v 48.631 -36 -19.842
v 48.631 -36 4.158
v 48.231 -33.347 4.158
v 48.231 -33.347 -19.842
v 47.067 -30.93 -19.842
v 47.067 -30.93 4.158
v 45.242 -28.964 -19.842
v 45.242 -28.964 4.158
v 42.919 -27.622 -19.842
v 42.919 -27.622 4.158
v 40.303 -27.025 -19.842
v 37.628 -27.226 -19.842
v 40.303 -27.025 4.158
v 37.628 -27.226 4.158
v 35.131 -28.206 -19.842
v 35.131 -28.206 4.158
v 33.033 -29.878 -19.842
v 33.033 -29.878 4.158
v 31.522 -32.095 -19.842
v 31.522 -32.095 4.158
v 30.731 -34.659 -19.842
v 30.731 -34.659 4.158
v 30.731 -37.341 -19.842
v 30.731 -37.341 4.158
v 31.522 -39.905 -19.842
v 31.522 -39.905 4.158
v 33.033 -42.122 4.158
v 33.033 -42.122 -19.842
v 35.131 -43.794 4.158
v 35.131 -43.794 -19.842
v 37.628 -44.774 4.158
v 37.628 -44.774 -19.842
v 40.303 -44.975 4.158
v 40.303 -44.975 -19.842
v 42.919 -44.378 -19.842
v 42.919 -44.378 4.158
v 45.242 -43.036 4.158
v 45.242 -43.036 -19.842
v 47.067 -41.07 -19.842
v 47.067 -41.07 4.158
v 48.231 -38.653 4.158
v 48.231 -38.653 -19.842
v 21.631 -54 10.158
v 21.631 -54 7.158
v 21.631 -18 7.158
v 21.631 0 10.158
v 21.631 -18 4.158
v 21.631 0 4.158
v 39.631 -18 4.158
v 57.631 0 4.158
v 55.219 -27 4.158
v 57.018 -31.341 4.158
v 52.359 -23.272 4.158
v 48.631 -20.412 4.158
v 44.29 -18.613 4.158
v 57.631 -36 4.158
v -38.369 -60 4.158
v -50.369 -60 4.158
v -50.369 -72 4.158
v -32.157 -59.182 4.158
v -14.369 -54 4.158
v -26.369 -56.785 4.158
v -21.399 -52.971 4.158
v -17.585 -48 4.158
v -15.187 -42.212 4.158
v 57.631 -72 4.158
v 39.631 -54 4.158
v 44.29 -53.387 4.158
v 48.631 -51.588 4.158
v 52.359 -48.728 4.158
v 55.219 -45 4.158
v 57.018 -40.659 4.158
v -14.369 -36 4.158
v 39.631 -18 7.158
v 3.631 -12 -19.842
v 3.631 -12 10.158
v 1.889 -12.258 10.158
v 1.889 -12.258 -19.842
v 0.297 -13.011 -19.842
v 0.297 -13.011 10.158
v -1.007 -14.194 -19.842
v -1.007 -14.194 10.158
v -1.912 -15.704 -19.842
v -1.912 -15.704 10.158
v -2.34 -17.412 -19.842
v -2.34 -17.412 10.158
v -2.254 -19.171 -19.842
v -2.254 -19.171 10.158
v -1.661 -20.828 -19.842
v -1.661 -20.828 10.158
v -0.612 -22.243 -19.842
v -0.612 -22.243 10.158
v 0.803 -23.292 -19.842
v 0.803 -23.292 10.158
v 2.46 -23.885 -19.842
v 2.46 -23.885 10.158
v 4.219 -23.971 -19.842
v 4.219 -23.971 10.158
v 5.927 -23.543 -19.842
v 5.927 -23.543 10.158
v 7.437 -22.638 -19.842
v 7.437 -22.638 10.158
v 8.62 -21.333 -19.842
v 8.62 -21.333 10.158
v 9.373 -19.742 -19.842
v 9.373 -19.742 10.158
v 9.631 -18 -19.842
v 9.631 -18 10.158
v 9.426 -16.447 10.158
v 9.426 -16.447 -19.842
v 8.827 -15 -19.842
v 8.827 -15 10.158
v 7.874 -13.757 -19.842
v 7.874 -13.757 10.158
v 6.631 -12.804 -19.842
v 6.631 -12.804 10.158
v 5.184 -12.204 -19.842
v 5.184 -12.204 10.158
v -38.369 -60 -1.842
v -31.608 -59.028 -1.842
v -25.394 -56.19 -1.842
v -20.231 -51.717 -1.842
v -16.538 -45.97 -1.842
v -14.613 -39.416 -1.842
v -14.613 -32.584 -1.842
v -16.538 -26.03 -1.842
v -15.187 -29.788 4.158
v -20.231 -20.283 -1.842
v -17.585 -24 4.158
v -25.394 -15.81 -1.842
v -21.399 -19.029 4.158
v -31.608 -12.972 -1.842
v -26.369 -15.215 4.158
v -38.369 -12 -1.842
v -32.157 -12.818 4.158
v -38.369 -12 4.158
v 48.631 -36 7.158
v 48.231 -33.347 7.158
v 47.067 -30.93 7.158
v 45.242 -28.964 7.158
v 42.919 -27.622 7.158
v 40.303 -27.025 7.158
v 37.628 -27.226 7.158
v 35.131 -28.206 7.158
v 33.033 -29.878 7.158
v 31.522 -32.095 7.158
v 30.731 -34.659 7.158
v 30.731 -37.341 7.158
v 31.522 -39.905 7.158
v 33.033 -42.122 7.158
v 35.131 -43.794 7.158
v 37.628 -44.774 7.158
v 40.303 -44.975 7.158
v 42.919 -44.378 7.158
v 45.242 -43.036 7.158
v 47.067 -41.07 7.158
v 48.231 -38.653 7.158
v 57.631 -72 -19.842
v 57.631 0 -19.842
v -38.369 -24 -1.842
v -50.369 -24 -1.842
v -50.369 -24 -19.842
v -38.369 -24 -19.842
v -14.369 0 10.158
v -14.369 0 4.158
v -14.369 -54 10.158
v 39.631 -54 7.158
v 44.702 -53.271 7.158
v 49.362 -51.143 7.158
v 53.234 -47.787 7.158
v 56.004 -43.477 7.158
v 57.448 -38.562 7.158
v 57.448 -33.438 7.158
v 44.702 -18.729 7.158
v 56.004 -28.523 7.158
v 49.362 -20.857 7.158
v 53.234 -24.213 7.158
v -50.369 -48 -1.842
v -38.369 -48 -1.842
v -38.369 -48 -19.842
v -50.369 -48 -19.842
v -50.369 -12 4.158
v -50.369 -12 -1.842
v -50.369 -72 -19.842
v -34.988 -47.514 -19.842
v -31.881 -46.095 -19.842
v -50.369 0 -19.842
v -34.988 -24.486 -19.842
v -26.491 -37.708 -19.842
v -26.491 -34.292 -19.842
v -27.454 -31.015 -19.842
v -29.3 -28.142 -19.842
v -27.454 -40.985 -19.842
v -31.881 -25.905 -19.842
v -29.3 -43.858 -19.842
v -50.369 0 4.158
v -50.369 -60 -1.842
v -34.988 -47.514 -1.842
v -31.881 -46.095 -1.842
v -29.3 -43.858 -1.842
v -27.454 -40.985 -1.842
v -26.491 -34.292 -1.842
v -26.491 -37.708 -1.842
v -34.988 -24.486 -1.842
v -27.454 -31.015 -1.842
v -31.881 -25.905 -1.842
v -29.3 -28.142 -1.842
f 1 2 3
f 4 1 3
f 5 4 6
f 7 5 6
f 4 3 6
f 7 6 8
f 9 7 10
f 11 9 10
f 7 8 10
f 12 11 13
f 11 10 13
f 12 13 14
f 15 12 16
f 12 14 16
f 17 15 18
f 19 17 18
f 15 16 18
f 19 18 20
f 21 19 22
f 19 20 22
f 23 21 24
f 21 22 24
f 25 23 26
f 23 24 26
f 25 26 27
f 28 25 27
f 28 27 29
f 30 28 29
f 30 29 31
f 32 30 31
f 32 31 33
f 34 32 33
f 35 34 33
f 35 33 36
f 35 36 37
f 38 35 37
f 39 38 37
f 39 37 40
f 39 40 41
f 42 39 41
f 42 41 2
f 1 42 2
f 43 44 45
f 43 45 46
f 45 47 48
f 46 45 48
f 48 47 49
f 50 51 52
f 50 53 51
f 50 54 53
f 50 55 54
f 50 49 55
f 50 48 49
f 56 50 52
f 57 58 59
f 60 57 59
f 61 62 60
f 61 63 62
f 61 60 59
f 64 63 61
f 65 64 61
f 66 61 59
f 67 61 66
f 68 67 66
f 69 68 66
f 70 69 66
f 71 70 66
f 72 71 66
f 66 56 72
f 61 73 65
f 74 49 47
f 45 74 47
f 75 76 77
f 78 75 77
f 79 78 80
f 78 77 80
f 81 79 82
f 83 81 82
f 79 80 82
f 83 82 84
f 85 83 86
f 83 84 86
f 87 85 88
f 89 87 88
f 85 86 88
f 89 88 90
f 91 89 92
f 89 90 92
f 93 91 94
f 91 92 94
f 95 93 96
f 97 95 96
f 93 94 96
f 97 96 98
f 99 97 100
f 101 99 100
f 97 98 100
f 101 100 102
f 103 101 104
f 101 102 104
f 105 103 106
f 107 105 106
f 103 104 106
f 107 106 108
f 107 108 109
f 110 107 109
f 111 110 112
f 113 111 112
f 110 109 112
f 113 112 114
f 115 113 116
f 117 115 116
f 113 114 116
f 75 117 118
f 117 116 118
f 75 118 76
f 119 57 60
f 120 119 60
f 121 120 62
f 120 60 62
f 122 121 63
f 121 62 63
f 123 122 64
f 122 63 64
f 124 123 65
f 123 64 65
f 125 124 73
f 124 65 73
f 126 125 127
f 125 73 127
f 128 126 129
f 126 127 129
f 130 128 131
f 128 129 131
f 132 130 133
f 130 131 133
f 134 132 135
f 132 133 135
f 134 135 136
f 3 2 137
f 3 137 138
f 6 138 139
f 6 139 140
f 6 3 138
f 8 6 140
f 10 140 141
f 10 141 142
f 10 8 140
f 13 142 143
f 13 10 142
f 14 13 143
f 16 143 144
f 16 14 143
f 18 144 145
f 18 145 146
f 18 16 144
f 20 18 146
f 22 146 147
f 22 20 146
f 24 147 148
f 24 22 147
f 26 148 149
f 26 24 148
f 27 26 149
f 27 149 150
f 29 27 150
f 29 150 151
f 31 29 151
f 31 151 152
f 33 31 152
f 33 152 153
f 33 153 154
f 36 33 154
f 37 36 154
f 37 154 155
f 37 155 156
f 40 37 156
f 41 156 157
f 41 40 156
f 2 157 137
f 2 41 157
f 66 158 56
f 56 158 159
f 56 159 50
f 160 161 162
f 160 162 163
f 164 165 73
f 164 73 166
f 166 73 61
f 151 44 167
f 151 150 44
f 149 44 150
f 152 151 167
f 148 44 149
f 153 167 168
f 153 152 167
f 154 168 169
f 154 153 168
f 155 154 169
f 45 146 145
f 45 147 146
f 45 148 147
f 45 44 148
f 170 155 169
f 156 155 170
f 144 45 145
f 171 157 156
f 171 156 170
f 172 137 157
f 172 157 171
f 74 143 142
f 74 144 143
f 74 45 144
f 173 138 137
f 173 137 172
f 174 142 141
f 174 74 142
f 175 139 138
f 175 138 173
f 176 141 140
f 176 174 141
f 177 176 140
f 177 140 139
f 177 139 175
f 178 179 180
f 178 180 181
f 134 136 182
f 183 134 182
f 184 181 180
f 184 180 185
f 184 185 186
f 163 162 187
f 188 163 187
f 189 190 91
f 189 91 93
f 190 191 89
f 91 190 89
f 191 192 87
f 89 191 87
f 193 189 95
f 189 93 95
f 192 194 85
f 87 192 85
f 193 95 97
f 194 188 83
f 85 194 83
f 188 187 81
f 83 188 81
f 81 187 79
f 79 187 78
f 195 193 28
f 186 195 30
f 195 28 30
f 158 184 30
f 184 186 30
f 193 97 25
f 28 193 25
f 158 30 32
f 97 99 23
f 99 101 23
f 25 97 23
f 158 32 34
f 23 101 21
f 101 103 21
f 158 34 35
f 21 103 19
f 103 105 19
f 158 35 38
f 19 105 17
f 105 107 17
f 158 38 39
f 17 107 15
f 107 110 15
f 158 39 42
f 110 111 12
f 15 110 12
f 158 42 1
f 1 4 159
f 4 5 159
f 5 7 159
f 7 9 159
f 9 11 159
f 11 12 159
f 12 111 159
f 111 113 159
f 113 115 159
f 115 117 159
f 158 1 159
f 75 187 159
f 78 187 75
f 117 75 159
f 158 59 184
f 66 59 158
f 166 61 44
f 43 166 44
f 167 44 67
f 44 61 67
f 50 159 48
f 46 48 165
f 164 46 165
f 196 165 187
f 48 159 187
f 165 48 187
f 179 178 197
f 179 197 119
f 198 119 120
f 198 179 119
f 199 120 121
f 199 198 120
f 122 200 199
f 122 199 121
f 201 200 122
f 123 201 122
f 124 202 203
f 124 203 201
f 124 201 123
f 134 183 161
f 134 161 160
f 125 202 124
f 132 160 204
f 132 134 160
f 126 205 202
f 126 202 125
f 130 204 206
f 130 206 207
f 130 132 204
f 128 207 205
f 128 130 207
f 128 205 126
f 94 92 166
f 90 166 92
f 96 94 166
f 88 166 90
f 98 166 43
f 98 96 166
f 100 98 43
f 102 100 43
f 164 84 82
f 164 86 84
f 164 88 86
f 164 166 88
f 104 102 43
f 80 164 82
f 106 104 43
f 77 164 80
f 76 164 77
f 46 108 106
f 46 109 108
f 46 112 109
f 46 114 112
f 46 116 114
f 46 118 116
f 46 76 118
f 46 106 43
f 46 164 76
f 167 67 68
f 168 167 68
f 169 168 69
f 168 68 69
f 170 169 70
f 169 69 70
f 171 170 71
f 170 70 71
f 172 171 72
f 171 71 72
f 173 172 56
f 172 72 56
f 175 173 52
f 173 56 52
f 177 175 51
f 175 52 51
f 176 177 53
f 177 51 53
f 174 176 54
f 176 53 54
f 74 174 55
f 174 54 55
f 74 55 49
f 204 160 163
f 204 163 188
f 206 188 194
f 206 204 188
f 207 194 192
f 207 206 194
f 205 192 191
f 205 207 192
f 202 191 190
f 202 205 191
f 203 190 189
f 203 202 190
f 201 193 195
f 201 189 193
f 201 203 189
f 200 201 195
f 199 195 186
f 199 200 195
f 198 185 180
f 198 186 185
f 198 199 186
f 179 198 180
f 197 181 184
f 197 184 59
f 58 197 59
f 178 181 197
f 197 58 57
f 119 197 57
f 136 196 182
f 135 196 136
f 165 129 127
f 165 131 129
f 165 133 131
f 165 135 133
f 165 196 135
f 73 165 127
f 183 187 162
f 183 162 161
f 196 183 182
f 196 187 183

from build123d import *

# Parameters (mm, degrees)
F0_W      = 108
F0_H      = 24
F1_DEPTH  = 72
F3_DEPTH  = 6
F4_DEPTH  = 24.001
F6_DEPTH  = 6
F8_DEPTH  = 30.001
F9_R      = 9
F10_DEPTH = 3
F11_DEPTH = 24.001


with BuildPart() as f1:
    # F0 (on Front) → F1 (new body)
    with BuildSketch(Plane.XZ):
        with Locations((3.6308863163, -7.8423750699)):
            Rectangle(F0_W, F0_H)
    extrude(amount=F1_DEPTH)

    # F2 (on face) → F3 (cut)
    with BuildSketch(Plane.XY.offset(4.1576249301)):
        with BuildLine():
            Line((-50.3691136837, -48), (-50.3691136837, -60))
            Line((-50.3691136837, -60), (-38.3691136837, -60))
            ThreePointArc((-38.3691136837, -60), (-14.3691136837, -36), (-38.3691136837, -12))
            Line((-38.3691136837, -12), (-50.3691136837, -12))
            Line((-50.3691136837, -12), (-50.3691136837, -24))
            Line((-50.3691136837, -24), (-38.3691136837, -24))
            ThreePointArc((-38.3691136837, -24), (-26.3691136837, -36), (-38.3691136837, -48))
            Line((-38.3691136837, -48), (-50.3691136837, -48))
        make_face()
    extrude(amount=-F3_DEPTH, mode=Mode.SUBTRACT)

    # F4 (cut, through all): a face of the model
    f4_faces = [f1.faces().sort_by_distance(p)[0] for p in [
        (-39.4893119907, -36, 4.1576249301),
    ]]
    extrude(f4_faces, amount=-F4_DEPTH, mode=Mode.SUBTRACT)

    # F5 (on face) → F6 (join)
    with BuildSketch(Plane.XY.offset(4.1576249301)):
        Polygon((21.6308863163, 0), (-14.3691136837, 0), (-14.3691136837, -36), (-14.3691136837, -54), (21.6308863163, -54), align=None)
    extrude(amount=F6_DEPTH)

    # F7 (on face) → F8 (cut, through all)
    with BuildSketch(Plane.XY.offset(10.1576249301)):
        with BuildLine():
            ThreePointArc((3.6308863163, -12), (-0.6117543708, -22.2426406871), (9.6308863163, -18))
            ThreePointArc((9.6308863163, -18), (7.8735270034, -13.7573593129), (3.6308863163, -12))
        make_face()
    extrude(amount=-F8_DEPTH, mode=Mode.SUBTRACT)

    # F9 (on face) → F10 (join)
    with BuildSketch(Plane.XY.offset(4.1576249301)):
        with BuildLine():
            Line((21.6308863163, -54), (39.6308863163, -54))
            ThreePointArc((39.6308863163, -54), (57.6308863163, -36), (39.6308863163, -18))
            Line((39.6308863163, -18), (21.6308863163, -18))
            Line((21.6308863163, -18), (21.6308863163, -54))
        make_face()
        with Locations((39.6308863163, -36)):
            Circle(F9_R, mode=Mode.SUBTRACT)
    extrude(amount=F10_DEPTH)

    # F11 (cut, through all): a face of the model
    f11_faces = [f1.faces().sort_by_distance(p)[0] for p in [
        (39.6308863163, -36, 4.1576249301),
    ]]
    extrude(f11_faces, amount=-F11_DEPTH, mode=Mode.SUBTRACT)


solid = f1.part
